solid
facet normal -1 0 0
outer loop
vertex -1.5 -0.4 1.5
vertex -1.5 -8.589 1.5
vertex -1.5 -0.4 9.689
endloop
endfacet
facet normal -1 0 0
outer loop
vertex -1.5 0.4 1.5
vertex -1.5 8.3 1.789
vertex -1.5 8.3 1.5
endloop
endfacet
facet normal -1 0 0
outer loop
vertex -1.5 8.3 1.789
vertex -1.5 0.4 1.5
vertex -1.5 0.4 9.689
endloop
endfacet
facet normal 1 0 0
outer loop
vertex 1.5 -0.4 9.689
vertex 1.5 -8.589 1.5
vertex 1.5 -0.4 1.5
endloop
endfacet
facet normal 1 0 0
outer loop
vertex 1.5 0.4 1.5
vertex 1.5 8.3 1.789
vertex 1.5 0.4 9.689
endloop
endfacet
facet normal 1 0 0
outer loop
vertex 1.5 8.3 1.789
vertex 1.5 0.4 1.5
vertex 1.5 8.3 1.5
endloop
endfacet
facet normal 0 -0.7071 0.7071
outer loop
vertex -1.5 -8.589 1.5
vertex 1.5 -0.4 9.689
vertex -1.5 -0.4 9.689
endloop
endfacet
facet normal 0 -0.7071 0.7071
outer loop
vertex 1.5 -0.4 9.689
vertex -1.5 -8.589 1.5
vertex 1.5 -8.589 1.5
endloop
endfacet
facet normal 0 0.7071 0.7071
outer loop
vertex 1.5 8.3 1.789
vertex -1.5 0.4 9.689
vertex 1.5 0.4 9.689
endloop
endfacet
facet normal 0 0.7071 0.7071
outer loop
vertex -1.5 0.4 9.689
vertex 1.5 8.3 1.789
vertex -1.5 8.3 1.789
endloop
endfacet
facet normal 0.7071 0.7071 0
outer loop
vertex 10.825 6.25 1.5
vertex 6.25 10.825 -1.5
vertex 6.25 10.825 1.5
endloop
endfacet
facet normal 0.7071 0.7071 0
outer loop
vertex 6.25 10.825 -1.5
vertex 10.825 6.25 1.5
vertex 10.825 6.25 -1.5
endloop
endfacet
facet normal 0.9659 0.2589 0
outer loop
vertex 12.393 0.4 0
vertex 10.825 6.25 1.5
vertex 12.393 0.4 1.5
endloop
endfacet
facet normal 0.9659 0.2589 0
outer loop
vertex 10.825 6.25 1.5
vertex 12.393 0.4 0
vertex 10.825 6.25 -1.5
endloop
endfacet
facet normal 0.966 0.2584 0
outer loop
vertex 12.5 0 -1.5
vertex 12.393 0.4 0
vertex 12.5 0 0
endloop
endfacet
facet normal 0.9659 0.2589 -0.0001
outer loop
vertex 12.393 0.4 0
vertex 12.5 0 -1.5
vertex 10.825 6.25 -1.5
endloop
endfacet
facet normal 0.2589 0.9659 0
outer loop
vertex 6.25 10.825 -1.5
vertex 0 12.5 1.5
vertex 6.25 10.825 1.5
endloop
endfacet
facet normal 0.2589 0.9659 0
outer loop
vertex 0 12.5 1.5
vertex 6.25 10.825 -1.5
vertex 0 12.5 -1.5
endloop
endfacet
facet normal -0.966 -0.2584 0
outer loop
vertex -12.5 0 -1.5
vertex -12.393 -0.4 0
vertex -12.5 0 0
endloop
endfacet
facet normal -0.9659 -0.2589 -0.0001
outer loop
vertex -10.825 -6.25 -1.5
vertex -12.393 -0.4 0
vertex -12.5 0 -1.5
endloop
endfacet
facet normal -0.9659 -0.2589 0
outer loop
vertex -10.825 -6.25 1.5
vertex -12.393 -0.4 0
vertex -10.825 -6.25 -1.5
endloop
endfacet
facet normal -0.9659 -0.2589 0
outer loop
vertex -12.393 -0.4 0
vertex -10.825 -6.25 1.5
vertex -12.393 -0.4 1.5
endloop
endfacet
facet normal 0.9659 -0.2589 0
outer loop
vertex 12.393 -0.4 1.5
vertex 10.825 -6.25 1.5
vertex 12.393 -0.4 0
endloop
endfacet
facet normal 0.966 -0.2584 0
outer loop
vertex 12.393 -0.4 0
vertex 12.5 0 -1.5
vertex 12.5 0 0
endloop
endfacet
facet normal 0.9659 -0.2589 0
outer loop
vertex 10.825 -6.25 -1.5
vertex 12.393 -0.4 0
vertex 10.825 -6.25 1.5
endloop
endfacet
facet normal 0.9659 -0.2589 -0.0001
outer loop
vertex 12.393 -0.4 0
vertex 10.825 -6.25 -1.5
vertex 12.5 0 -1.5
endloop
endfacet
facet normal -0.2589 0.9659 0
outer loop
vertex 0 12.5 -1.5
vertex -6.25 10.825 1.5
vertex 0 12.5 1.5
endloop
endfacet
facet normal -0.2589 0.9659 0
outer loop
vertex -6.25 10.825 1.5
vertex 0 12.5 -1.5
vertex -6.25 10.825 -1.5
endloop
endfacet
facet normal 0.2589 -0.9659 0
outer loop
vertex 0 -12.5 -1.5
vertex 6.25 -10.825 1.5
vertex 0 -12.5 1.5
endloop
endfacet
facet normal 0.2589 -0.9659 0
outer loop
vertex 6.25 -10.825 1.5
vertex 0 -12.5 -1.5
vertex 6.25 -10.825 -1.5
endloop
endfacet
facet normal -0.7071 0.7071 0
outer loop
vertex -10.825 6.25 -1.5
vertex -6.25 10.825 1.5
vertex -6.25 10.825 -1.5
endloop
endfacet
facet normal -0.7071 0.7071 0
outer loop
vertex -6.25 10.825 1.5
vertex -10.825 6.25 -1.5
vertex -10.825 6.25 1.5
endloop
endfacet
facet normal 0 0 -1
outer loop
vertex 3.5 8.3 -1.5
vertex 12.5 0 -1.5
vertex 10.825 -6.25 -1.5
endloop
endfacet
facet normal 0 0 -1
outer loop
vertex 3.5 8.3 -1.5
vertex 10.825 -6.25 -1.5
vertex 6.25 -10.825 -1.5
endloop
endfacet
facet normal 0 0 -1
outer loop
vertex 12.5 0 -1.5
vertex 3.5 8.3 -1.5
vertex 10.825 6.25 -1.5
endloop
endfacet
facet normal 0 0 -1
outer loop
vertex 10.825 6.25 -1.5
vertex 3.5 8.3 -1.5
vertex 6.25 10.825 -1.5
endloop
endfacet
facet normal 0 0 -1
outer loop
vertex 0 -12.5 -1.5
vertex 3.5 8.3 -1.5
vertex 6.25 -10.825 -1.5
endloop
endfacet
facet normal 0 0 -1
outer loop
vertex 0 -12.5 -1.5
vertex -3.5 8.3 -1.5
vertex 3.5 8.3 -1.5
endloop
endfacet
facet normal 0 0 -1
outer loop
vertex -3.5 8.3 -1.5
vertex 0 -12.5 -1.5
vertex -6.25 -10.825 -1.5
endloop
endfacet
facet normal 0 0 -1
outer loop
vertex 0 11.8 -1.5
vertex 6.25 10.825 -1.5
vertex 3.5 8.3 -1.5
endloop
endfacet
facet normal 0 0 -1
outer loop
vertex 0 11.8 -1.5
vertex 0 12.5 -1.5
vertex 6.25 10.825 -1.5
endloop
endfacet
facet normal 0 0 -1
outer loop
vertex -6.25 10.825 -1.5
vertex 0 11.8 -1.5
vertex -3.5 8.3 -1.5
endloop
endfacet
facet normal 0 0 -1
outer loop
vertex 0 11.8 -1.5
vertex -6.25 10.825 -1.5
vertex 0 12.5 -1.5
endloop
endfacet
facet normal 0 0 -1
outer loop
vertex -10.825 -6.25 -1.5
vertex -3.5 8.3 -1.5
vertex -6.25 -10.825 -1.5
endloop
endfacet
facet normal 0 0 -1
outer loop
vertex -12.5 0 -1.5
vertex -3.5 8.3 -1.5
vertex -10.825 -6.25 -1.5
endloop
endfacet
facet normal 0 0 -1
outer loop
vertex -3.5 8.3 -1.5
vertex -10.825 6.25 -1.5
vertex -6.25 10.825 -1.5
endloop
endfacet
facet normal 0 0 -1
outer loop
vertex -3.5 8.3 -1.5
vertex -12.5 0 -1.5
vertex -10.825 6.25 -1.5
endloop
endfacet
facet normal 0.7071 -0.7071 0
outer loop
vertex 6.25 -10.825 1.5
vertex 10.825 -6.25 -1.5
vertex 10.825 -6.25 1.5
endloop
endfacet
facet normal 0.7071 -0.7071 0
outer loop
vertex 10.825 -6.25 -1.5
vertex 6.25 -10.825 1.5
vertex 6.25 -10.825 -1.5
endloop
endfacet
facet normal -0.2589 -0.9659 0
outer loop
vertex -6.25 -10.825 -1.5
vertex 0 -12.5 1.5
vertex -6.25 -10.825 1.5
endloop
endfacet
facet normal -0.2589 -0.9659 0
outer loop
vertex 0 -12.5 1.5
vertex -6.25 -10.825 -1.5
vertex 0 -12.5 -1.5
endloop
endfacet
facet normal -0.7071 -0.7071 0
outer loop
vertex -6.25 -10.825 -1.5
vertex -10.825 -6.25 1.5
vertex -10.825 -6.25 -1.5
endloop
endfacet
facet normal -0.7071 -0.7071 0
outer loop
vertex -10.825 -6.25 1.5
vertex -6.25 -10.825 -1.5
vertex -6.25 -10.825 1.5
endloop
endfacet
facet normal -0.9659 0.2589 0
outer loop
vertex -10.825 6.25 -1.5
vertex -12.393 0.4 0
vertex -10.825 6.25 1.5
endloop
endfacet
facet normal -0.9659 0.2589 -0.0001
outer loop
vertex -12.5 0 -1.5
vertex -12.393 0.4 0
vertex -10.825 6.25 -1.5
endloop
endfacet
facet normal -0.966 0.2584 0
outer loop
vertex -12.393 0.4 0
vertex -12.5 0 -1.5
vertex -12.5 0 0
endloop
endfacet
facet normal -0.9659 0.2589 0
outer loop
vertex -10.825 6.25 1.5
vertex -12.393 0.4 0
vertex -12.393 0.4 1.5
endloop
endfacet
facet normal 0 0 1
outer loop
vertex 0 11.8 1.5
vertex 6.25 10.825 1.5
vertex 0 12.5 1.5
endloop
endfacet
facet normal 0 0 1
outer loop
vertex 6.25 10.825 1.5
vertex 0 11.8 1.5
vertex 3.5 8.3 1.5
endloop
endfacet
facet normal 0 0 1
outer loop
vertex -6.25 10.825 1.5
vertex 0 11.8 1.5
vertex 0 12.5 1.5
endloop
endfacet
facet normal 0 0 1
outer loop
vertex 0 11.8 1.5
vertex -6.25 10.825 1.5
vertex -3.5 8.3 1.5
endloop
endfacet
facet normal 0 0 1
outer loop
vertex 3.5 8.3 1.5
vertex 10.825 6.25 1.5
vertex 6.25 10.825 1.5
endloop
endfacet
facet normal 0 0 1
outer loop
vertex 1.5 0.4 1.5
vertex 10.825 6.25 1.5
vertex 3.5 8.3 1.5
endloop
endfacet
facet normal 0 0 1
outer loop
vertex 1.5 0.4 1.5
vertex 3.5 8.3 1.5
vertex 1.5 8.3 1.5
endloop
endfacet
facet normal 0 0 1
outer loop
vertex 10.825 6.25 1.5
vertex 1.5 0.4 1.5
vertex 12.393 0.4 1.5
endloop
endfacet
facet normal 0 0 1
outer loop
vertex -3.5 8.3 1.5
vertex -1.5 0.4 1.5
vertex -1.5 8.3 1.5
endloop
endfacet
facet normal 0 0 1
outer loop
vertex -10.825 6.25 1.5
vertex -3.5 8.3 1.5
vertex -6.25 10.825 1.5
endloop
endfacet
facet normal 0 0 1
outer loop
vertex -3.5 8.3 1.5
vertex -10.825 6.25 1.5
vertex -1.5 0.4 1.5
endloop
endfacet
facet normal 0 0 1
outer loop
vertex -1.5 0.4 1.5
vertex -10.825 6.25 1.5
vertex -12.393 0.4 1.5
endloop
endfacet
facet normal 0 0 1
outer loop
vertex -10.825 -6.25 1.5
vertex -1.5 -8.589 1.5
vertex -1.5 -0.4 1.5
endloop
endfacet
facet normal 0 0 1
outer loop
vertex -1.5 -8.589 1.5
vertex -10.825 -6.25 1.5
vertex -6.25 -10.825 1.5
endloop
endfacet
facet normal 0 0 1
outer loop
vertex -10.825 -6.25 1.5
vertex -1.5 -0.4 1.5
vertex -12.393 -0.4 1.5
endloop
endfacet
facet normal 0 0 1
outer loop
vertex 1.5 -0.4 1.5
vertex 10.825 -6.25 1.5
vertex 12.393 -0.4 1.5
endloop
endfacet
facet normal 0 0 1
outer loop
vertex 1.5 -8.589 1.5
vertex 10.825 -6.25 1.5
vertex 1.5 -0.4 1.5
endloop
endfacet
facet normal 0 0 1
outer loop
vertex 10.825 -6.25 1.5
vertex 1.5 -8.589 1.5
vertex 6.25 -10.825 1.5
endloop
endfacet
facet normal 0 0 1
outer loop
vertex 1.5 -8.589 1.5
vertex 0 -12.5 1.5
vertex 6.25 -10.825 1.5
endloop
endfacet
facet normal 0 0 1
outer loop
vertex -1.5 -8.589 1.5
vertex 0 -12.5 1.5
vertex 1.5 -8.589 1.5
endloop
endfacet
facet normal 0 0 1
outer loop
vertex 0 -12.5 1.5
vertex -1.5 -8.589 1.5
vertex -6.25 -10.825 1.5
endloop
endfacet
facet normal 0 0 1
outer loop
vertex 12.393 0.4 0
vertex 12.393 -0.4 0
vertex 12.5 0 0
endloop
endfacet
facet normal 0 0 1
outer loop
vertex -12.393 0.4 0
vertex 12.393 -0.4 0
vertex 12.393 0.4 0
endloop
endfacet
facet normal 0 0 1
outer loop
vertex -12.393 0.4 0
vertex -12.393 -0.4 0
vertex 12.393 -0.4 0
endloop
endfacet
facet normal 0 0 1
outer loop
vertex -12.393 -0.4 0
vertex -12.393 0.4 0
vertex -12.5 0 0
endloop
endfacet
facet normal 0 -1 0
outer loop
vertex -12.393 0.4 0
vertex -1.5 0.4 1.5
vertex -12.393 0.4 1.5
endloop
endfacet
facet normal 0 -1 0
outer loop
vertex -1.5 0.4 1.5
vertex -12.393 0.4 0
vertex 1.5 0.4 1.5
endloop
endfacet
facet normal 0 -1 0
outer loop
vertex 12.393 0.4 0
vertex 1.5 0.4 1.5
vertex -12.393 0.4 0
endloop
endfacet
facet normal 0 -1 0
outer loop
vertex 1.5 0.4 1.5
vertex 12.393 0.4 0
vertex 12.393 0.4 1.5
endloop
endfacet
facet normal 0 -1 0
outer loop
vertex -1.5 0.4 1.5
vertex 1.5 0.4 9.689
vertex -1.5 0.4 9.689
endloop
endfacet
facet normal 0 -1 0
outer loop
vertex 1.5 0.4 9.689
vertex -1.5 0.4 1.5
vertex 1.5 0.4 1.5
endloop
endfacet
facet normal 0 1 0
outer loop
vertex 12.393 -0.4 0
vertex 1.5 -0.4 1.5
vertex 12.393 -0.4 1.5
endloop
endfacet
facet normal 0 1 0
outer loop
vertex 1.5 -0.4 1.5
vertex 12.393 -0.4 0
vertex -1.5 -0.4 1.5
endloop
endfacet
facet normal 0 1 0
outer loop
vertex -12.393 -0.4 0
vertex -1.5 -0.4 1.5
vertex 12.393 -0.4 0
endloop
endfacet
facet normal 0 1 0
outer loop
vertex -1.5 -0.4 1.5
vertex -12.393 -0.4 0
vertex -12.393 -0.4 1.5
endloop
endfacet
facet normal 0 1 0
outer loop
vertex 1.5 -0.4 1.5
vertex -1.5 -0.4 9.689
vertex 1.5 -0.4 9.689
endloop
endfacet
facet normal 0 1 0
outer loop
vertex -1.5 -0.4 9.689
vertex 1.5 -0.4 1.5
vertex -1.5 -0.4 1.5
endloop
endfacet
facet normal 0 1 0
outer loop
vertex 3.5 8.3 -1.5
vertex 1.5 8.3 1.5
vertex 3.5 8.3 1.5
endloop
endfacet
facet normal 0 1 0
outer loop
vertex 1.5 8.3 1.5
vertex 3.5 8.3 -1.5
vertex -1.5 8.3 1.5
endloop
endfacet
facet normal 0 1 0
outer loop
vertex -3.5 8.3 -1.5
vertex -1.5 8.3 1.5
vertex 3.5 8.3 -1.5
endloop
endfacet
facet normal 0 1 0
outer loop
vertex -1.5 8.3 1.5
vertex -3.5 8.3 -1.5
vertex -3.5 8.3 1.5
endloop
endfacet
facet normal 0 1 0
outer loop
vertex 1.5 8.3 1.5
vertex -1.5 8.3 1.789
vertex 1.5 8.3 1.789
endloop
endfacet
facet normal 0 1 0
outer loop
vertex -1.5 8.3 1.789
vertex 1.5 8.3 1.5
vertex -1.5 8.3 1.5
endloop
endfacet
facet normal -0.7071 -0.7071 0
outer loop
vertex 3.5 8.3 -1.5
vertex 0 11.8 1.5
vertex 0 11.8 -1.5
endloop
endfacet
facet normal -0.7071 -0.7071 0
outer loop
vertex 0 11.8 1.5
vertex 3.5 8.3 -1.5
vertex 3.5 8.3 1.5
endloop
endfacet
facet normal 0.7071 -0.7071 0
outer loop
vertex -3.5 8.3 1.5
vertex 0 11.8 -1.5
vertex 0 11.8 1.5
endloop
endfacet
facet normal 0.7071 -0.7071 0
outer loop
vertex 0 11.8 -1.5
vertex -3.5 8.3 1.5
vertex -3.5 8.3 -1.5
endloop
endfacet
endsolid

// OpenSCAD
$fn=12;

// unit is mm

diameter = 25;
thickness = 3;
slit_width = 0.8;
arrow_base = 7;
support_height = 10;

ab_2 = arrow_base / 2;
thickness12 = 1.2 * thickness;
diameter_2 = diameter / 2;


difference() {

  union() {

    // base

    cylinder(d=diameter, h=thickness, center=true);

    // support

    translate([ 0, 0, 0 ]) difference() {
      translate([ 0, 0, -0.7 * diameter_2 + support_height  ])
        rotate([ 45, 0, 0 ])
          cube([ thickness, diameter_2, diameter_2 ], center=true);
      translate([ 0, 0, -diameter_2 ])
        cube([ diameter, diameter, diameter ], center=true);
    }
    //translate([ thickness, 0, 0 ]) difference() {
    //  translate([ 0, 0, -0.7 * diameter_2 + support_height  ])
    //    rotate([ 45, 0, 0 ])
    //      cube([ thickness, diameter_2, diameter_2 ], center=true);
    //  translate([ 0, 0, -diameter_2 ])
    //    cube([ diameter, diameter, diameter ], center=true);
    //}
  }

  union() {

    // slit

    #translate([ 0, 0, diameter_2 + 0.0 * thickness ])
      cube([ diameter, slit_width, diameter ], center=true);

    // arrow

    translate([ 0, diameter_2 - 1.2 * ab_2, -0.5 * thickness12 ])
      linear_extrude(thickness12)
        polygon([
          [ -ab_2, 0 ], [ 0, ab_2 ], [ ab_2, 0 ] ]);
  }
}
